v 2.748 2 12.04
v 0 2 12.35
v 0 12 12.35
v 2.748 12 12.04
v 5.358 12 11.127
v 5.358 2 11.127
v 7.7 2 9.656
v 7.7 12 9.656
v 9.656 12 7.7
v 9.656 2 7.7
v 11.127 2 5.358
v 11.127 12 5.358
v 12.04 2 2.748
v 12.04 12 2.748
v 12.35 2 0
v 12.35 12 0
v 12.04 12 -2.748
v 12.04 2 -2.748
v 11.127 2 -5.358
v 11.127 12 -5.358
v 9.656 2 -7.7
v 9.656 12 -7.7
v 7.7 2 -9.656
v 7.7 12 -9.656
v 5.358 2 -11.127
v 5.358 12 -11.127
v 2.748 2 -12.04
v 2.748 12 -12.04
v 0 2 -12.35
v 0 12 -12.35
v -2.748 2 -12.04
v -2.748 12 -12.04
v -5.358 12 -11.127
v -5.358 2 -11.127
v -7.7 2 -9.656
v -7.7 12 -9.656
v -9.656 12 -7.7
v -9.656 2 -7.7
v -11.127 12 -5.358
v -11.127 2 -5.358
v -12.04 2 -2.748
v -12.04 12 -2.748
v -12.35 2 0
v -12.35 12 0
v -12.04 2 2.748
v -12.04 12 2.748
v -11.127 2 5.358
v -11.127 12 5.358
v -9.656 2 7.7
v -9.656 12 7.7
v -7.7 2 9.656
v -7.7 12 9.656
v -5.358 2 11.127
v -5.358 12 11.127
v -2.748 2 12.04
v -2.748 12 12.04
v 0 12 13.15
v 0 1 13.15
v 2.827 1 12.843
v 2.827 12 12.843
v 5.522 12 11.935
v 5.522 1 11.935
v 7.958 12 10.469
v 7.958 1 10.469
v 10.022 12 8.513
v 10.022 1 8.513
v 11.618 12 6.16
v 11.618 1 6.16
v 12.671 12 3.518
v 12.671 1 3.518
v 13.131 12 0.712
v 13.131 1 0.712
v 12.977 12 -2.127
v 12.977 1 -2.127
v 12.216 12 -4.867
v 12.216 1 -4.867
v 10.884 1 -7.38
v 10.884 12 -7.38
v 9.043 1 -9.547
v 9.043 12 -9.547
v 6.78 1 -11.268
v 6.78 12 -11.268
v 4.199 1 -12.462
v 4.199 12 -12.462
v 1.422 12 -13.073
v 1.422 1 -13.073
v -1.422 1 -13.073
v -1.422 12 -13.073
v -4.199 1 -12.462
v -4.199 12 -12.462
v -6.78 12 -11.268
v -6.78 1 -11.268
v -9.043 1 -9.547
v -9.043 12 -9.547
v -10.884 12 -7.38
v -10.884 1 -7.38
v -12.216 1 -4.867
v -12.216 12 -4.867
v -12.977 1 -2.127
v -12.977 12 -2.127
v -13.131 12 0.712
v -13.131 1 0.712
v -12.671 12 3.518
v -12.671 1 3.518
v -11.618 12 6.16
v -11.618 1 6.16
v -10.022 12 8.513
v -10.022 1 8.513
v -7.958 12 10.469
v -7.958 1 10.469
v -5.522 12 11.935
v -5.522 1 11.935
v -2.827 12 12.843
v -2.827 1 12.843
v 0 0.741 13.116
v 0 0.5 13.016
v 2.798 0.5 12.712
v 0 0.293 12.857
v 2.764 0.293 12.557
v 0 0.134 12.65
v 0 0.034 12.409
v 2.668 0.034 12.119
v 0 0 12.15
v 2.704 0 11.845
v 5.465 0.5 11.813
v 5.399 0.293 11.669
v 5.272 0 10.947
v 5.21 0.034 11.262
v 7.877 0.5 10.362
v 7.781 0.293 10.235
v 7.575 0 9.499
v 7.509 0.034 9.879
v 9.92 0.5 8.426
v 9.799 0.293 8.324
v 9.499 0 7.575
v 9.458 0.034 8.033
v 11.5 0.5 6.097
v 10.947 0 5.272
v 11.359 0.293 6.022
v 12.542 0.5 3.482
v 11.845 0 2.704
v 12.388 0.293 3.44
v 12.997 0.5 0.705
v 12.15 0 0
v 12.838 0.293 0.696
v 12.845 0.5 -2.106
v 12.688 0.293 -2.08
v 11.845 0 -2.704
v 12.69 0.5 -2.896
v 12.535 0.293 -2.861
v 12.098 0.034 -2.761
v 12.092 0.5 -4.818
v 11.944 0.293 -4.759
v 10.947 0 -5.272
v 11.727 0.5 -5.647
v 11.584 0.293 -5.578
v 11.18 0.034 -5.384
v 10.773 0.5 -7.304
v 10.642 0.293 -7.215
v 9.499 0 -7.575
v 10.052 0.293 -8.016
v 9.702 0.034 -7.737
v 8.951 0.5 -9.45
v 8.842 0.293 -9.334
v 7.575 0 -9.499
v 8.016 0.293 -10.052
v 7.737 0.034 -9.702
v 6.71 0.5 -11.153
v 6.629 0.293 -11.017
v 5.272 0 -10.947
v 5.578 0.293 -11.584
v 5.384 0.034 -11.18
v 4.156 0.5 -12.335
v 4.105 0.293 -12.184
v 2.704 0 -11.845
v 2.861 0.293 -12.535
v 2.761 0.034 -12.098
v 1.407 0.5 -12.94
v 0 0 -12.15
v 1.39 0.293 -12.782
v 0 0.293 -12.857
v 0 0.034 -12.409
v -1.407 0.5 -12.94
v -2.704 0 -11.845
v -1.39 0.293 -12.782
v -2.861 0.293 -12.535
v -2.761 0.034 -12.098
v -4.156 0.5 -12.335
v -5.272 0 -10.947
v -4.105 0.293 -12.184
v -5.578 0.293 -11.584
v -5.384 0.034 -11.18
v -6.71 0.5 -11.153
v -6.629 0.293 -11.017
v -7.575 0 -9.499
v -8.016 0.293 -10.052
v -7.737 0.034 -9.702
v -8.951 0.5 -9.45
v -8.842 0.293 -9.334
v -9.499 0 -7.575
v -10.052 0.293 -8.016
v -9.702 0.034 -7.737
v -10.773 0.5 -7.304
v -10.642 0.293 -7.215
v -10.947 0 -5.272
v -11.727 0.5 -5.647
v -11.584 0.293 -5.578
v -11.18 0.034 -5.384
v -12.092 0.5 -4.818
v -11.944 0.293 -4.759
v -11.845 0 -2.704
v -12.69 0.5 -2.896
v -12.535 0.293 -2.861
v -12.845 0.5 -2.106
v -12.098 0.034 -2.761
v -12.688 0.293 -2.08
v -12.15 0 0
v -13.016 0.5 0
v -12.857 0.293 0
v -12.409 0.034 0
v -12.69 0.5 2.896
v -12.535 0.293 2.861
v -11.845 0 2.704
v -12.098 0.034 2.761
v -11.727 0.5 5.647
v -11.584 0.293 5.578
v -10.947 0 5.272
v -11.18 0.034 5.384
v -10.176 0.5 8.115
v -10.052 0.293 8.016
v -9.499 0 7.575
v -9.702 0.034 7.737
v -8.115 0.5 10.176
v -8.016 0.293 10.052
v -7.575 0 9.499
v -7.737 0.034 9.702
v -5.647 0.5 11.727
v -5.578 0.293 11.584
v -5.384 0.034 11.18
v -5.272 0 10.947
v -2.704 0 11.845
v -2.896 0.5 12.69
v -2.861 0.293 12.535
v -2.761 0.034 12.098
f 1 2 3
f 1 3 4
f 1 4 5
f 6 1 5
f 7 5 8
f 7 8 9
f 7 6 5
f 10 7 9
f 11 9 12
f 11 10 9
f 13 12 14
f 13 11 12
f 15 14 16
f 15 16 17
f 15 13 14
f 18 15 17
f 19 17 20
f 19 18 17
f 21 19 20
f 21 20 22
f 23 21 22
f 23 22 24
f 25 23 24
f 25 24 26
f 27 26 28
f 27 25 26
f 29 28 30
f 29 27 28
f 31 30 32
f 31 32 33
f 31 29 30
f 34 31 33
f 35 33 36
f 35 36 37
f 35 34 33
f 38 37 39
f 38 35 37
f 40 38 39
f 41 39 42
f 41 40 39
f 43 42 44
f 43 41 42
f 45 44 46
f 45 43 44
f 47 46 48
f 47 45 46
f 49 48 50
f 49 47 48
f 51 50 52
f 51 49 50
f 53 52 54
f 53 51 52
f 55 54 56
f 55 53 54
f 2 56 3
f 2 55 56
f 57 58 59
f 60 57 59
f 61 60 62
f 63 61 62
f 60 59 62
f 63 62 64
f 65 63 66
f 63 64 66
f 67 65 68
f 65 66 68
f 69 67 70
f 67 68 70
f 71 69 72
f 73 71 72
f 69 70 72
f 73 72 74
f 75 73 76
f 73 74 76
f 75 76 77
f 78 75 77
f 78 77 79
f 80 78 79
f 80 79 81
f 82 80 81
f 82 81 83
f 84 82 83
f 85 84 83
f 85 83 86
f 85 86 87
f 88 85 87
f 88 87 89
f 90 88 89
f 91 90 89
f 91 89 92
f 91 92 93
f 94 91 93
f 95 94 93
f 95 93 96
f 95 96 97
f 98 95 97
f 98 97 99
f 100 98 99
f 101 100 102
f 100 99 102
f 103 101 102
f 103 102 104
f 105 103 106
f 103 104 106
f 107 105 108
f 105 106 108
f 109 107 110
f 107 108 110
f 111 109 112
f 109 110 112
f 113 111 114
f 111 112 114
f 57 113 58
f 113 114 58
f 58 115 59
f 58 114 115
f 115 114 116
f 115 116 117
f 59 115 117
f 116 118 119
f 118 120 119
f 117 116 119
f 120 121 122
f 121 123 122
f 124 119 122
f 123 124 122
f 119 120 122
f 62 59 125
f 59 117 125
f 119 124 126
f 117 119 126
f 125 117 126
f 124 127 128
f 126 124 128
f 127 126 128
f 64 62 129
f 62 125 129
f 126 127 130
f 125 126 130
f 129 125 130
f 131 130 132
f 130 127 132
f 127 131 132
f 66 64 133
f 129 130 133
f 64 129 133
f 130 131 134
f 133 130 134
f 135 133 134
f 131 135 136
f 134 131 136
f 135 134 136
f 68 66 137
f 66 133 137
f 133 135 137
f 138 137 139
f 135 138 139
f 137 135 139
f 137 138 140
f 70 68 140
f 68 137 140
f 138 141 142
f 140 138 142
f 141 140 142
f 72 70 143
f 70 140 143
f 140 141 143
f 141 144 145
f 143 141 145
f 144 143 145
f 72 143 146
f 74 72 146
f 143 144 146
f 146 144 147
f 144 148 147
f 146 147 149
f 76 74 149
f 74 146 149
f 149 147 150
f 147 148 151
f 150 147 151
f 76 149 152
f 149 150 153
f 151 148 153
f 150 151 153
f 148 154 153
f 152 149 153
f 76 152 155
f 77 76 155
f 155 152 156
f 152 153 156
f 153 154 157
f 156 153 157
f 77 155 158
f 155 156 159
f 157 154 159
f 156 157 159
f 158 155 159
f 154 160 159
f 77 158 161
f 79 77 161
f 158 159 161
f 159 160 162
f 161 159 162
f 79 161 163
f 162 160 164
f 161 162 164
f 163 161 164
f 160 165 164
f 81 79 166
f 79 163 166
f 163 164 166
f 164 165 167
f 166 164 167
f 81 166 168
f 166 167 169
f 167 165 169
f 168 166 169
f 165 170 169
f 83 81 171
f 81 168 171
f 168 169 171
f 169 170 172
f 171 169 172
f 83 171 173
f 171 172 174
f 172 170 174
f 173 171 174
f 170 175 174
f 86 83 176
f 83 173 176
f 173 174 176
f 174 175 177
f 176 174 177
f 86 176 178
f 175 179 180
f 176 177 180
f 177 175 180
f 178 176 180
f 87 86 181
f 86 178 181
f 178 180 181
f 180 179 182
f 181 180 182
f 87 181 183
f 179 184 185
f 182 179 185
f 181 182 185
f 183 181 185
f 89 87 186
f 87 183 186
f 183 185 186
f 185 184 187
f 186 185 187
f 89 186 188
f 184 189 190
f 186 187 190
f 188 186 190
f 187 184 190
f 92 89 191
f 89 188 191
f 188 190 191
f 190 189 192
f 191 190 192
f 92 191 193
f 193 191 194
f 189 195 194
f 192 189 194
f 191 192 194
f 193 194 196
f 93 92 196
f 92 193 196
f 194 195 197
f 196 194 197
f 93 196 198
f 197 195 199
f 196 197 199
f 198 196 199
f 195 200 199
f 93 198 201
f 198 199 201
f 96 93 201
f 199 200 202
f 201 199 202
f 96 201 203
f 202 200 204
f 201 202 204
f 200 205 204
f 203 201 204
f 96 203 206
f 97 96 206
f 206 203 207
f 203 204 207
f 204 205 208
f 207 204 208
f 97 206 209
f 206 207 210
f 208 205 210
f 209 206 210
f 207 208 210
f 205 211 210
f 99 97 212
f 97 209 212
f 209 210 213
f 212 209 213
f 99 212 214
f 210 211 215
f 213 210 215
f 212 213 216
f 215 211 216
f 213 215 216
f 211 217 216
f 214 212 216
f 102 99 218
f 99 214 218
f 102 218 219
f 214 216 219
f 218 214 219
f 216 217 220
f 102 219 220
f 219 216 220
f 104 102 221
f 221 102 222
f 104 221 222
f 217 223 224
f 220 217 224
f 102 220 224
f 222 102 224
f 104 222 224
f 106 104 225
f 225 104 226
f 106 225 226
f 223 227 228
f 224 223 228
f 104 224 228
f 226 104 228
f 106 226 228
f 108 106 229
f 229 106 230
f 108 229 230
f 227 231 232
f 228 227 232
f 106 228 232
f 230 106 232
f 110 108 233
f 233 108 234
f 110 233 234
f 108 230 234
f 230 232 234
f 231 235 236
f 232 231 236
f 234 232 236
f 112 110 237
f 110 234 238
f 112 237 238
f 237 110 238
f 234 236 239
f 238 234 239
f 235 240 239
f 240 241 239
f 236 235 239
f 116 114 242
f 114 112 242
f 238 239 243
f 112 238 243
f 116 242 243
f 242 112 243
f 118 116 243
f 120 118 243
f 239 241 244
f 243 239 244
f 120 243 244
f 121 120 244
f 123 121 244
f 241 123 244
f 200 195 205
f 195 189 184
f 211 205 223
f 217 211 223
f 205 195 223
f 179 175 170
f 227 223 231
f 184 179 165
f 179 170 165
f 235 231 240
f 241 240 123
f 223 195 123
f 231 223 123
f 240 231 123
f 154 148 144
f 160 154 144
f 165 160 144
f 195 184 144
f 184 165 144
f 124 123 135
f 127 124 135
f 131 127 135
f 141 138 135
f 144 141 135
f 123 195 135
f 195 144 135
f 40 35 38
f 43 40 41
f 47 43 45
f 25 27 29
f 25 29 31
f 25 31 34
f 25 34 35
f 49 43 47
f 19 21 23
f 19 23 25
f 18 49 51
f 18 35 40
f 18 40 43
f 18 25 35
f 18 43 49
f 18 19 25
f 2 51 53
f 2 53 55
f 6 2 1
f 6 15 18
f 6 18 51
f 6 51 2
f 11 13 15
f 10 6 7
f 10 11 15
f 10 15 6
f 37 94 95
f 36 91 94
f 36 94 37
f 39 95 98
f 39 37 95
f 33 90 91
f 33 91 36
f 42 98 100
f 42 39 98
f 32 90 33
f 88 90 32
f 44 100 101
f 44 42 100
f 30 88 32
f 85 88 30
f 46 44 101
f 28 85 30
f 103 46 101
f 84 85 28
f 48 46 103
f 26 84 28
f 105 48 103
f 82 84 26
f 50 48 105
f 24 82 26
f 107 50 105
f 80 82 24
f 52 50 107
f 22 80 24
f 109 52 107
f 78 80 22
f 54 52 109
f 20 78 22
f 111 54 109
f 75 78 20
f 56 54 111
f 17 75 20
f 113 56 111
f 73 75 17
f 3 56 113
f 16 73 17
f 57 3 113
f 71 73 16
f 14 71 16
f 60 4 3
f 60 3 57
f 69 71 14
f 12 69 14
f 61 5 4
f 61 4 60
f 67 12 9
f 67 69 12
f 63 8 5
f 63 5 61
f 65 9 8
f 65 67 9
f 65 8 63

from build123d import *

# Parameters (mm, degrees)
SKETCH1_R           = 13.15
BOSS_EXTRUDE1_DEPTH = 2
SKETCH2_R           = 13.15
SKETCH2_R_2         = 12.35
BOSS_EXTRUDE2_DEPTH = 10
FILLET1_R           = 1


with BuildPart() as part:
    # Sketch1 → Boss-Extrude1 (new body)
    with BuildSketch(Plane(origin=(0, 0, 0), x_dir=(1, 0, 0), z_dir=(0, 1, 0))):
        with Locations(Location((0, 0, 0), (0, 0, 270))):
            Circle(SKETCH1_R)
    extrude(amount=BOSS_EXTRUDE1_DEPTH)

    # Sketch2 → Boss-Extrude2 (add)
    with BuildSketch(Plane(origin=(0, 2, 0), x_dir=(1, 0, 0), z_dir=(0, 1, 0))):
        with Locations(Location((0, 0, 0), (0, 0, 270))):
            Circle(SKETCH2_R)
        with Locations(Location((0, 0, 0), (0, 0, 270))):
            Circle(SKETCH2_R_2, mode=Mode.SUBTRACT)
    extrude(amount=BOSS_EXTRUDE2_DEPTH)

    # Fillet1
    fillet1_edges = [part.edges().sort_by_distance(p)[0] for p in [
        (0, 0, -13.15),
    ]]
    fillet(fillet1_edges, radius=FILLET1_R)


solid = part.part
